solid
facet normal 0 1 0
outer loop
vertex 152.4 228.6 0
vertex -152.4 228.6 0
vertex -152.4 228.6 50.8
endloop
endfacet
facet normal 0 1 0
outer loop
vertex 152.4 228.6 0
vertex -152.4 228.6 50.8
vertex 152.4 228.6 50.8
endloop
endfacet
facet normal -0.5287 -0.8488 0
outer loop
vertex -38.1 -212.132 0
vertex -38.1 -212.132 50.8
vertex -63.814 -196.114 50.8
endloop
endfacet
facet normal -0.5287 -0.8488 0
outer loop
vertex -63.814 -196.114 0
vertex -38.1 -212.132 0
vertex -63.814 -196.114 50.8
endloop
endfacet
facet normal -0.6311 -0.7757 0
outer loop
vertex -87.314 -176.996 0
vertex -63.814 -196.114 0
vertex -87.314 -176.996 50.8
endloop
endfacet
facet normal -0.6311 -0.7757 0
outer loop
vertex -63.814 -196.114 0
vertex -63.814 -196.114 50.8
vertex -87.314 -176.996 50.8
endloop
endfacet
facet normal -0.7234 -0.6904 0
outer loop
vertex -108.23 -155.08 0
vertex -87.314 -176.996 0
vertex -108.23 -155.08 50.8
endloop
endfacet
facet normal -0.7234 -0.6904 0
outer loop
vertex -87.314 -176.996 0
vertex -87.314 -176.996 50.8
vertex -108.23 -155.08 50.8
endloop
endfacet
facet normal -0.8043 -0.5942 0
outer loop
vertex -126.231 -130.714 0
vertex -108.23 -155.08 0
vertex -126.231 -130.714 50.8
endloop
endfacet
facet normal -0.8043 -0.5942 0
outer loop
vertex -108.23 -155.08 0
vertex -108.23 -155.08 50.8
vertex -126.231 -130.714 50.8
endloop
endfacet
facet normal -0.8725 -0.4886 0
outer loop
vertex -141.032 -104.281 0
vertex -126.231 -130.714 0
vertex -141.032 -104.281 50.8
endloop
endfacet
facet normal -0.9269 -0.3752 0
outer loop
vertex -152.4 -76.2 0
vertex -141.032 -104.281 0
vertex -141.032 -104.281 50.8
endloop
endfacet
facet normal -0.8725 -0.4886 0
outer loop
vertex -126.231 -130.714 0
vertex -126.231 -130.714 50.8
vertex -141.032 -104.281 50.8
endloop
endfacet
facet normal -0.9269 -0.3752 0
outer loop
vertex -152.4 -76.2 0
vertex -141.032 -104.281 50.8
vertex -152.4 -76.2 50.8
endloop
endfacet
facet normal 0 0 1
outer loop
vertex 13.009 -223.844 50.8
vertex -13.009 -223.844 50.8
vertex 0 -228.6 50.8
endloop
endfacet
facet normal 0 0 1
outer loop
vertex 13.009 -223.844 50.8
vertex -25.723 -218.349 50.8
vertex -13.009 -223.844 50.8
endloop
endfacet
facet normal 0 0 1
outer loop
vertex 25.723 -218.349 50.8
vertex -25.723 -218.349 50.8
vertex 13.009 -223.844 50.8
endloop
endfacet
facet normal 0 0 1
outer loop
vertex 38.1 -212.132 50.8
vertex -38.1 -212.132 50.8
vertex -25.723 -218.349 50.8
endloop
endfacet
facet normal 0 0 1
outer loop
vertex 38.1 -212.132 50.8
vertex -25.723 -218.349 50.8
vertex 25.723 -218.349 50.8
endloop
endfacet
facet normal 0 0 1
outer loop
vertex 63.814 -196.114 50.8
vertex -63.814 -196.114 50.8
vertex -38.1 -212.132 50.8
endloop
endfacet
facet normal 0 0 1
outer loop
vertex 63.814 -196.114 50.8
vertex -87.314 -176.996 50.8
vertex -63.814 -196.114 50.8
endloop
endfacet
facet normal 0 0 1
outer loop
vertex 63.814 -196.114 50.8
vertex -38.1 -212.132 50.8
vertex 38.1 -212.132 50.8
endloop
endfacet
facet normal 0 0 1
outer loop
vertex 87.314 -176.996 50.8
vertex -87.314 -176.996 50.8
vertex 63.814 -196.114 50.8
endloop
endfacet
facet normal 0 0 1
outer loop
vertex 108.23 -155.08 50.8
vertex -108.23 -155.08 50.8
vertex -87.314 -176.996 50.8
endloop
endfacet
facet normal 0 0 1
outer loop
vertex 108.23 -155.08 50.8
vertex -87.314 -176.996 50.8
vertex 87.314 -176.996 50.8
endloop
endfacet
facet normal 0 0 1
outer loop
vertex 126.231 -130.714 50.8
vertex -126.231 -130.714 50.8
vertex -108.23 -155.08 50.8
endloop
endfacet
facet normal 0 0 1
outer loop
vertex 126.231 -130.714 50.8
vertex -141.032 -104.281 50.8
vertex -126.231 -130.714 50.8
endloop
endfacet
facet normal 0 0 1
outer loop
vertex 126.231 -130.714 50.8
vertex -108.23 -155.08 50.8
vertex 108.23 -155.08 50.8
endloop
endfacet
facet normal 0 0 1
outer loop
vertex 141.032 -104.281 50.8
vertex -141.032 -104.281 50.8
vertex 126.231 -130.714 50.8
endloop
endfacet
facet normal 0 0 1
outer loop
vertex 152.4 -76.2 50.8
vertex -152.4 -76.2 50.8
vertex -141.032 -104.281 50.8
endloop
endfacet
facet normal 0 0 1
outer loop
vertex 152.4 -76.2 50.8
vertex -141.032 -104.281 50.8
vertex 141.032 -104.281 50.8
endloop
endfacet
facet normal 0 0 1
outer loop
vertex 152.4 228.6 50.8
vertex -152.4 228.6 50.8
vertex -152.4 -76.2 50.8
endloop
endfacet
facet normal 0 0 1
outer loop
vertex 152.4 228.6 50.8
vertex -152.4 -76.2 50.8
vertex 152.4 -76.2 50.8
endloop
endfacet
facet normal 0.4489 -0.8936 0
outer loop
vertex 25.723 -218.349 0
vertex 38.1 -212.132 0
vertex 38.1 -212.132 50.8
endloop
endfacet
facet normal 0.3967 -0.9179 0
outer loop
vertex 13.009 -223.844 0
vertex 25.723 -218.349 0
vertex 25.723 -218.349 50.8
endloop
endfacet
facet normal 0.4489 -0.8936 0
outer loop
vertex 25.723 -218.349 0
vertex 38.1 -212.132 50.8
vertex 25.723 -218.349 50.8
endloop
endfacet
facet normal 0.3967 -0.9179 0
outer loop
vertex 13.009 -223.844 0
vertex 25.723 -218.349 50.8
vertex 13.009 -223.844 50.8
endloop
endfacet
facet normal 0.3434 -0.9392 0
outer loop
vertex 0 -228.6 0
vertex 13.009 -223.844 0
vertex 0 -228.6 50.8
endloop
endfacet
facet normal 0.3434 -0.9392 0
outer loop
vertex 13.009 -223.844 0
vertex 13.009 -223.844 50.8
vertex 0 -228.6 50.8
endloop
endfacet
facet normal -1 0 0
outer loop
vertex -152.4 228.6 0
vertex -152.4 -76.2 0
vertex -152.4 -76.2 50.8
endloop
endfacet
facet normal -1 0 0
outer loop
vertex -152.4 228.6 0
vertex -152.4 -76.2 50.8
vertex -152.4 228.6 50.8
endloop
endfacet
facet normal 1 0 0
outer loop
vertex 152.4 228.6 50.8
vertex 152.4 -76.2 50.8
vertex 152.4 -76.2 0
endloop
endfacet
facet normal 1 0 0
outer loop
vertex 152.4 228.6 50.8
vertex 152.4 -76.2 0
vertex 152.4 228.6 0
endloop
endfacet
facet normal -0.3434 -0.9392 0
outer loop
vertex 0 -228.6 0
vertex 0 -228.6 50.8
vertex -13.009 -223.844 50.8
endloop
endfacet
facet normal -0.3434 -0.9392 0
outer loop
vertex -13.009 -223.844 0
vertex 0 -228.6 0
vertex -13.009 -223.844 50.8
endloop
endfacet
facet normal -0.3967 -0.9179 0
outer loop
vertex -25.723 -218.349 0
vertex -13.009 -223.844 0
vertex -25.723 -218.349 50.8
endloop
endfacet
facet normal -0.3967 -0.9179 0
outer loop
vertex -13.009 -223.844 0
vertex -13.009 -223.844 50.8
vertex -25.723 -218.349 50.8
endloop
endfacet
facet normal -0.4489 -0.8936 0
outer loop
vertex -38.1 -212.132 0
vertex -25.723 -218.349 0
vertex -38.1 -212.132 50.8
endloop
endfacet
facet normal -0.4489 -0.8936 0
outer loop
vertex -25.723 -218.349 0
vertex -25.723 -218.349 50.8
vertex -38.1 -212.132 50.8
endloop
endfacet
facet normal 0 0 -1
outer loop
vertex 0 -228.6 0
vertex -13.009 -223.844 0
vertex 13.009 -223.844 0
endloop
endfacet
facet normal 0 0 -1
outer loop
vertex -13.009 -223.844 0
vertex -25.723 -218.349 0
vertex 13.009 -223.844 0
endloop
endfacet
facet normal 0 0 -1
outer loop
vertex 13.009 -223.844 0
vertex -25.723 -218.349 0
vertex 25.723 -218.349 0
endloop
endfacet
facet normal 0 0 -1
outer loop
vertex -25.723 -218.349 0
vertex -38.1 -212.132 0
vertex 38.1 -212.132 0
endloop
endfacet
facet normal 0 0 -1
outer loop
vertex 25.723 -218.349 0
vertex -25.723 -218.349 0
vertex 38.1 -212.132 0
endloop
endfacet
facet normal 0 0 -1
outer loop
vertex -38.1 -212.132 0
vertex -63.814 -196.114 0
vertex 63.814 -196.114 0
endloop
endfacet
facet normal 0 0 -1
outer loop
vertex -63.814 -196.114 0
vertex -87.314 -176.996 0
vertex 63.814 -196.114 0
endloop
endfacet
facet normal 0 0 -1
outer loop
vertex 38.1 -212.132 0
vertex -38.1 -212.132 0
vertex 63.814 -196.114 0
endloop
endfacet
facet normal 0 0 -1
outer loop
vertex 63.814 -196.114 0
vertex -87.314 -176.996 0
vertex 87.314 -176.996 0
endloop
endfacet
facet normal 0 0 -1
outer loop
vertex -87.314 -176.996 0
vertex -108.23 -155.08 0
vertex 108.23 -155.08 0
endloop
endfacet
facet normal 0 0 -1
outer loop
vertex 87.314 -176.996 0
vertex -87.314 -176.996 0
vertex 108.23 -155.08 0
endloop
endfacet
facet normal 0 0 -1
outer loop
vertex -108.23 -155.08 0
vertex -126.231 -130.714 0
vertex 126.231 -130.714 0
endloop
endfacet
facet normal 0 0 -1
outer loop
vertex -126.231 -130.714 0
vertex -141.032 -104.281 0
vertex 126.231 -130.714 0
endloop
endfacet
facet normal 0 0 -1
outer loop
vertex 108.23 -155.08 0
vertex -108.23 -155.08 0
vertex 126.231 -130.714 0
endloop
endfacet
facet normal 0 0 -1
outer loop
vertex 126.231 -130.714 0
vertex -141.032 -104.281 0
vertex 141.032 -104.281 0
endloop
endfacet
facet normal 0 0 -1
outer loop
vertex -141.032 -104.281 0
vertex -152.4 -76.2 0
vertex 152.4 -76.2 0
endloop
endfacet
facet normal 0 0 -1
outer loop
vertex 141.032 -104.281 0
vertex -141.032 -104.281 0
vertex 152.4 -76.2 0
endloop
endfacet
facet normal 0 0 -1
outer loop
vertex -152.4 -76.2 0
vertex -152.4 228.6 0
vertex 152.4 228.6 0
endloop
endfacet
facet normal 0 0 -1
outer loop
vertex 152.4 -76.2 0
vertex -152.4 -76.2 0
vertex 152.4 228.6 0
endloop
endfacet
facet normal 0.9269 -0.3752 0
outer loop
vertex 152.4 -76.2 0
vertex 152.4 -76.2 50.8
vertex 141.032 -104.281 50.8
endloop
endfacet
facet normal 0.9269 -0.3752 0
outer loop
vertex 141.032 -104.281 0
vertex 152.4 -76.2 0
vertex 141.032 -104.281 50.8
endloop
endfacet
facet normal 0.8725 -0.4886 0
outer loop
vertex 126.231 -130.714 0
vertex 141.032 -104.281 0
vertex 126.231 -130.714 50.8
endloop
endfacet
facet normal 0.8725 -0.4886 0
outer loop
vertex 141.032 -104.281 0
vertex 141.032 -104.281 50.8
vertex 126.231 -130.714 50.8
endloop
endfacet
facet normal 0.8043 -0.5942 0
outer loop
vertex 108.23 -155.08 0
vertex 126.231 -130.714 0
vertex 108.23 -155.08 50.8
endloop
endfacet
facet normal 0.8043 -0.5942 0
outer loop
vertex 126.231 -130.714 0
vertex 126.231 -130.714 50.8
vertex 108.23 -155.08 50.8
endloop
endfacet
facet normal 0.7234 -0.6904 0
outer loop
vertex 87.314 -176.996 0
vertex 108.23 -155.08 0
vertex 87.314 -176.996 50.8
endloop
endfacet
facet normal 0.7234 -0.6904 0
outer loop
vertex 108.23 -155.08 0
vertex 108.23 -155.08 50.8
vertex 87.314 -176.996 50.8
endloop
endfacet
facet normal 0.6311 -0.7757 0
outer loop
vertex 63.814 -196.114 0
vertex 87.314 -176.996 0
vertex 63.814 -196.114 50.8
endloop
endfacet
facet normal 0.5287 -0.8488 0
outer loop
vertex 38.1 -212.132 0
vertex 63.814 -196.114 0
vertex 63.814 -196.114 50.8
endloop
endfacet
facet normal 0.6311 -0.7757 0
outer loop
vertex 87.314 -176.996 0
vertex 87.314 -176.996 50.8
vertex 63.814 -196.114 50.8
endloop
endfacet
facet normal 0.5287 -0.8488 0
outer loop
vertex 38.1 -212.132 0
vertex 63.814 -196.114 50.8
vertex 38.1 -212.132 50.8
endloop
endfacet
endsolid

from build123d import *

# Parameters (mm, degrees)
F0_W     = 304.8
F0_H     = 457.2
F1_DEPTH = 50.8
F2_W     = 76.2
F2_H     = 75.8903771639
F2_H_2   = 75.2589152813
F3_DEPTH = 50.8
F4_DEPTH = 50.8
F5_DEPTH = 50.8
F6_DEPTH = 50.8


with BuildPart() as f1:
    # F0 (on Top) → F1 (new body)
    with BuildSketch(Plane.XY):
        Rectangle(F0_W, F0_H)
    extrude(amount=F1_DEPTH)

    # F2 (on face) → F3 (join)
    with BuildSketch(Plane.XY.offset(50.8)):
        Polygon((-38.1, 0), (0, 0), (38.1, 0), (38.1, 77.4507075548), (-38.1, 77.4507075548), align=None)
        with BuildLine():
            Line((38.1, 0), (0, 0))
            Line((0, 0), (-38.1, 0))
            Line((-38.1, 0), (-38.1, -212.1318222238))
            ThreePointArc((-38.1, -212.1318222238), (-19.4052442067, -221.1877873667), (0, -228.6))
            ThreePointArc((0, -228.6), (19.4052442067, -221.1877873667), (38.1, -212.1318222238))
            Line((38.1, -212.1318222238), (38.1, 0))
        make_face()
        with Locations((0, 115.3958961368)):
            Rectangle(F2_W, F2_H)
        with BuildLine():
            Line((38.1, -228.6), (38.1, -212.1318222238))
            ThreePointArc((38.1, -212.1318222238), (19.4052442067, -221.1877873667), (0, -228.6))
            Line((0, -228.6), (38.1, -228.6))
        make_face()
        with BuildLine():
            ThreePointArc((0, -228.6), (-19.4052442067, -221.1877873667), (-38.1, -212.1318222238))
            Line((-38.1, -212.1318222238), (-38.1, -228.6))
            Line((-38.1, -228.6), (0, -228.6))
        make_face()
        with Locations((0, 190.9705423594)):
            Rectangle(F2_W, F2_H_2)
        with BuildLine():
            Line((76.2, 0), (38.1, 0))
            Line((38.1, 0), (38.1, -212.1318222238))
            ThreePointArc((38.1, -212.1318222238), (108.2301156896, -155.0804063276), (152.4, -76.2))
            Line((152.4, -76.2), (152.4, 0))
            Line((152.4, 0), (76.2, 0))
        make_face()
    extrude(amount=-F3_DEPTH)

    # F2 (on face) → F4 (cut)
    with BuildSketch(Plane.XY.offset(50.8)):
        with BuildLine():
            ThreePointArc((0, -228.6), (-19.4052442067, -221.1877873667), (-38.1, -212.1318222238))
            Line((-38.1, -212.1318222238), (-38.1, -228.6))
            Line((-38.1, -228.6), (0, -228.6))
        make_face()
        with BuildLine():
            Line((-38.1, -228.6), (-38.1, -212.1318222238))
            ThreePointArc((-38.1, -212.1318222238), (-108.2301156896, -155.0804063276), (-152.4, -76.2))
            Line((-152.4, -76.2), (-152.4, -228.6))
            Line((-152.4, -228.6), (-38.1, -228.6))
        make_face()
    extrude(amount=-F4_DEPTH, mode=Mode.SUBTRACT)

    # F2 (on face) → F5 (cut)
    with BuildSketch(Plane.XY.offset(50.8)):
        with BuildLine():
            Line((38.1, -228.6), (38.1, -212.1318222238))
            ThreePointArc((38.1, -212.1318222238), (19.4052442067, -221.1877873667), (0, -228.6))
            Line((0, -228.6), (38.1, -228.6))
        make_face()
        with BuildLine():
            ThreePointArc((152.4, -76.2), (108.2301156896, -155.0804063276), (38.1, -212.1318222238))
            Line((38.1, -212.1318222238), (38.1, -228.6))
            Line((38.1, -228.6), (152.4, -228.6))
            Line((152.4, -228.6), (152.4, -76.2))
        make_face()
    extrude(amount=-F5_DEPTH, mode=Mode.SUBTRACT)

    # F2 (on face) → F6 (cut)
    with BuildSketch(Plane.XY.offset(50.8)):
        with BuildLine():
            Line((-38.1, -228.6), (-38.1, -212.1318222238))
            ThreePointArc((-38.1, -212.1318222238), (-108.2301156896, -155.0804063276), (-152.4, -76.2))
            Line((-152.4, -76.2), (-152.4, -228.6))
            Line((-152.4, -228.6), (-38.1, -228.6))
        make_face()
        with BuildLine():
            ThreePointArc((152.4, -76.2), (108.2301156896, -155.0804063276), (38.1, -212.1318222238))
            Line((38.1, -212.1318222238), (38.1, -228.6))
            Line((38.1, -228.6), (152.4, -228.6))
            Line((152.4, -228.6), (152.4, -76.2))
        make_face()
    extrude(amount=-F6_DEPTH, mode=Mode.SUBTRACT)


solid = f1.part
